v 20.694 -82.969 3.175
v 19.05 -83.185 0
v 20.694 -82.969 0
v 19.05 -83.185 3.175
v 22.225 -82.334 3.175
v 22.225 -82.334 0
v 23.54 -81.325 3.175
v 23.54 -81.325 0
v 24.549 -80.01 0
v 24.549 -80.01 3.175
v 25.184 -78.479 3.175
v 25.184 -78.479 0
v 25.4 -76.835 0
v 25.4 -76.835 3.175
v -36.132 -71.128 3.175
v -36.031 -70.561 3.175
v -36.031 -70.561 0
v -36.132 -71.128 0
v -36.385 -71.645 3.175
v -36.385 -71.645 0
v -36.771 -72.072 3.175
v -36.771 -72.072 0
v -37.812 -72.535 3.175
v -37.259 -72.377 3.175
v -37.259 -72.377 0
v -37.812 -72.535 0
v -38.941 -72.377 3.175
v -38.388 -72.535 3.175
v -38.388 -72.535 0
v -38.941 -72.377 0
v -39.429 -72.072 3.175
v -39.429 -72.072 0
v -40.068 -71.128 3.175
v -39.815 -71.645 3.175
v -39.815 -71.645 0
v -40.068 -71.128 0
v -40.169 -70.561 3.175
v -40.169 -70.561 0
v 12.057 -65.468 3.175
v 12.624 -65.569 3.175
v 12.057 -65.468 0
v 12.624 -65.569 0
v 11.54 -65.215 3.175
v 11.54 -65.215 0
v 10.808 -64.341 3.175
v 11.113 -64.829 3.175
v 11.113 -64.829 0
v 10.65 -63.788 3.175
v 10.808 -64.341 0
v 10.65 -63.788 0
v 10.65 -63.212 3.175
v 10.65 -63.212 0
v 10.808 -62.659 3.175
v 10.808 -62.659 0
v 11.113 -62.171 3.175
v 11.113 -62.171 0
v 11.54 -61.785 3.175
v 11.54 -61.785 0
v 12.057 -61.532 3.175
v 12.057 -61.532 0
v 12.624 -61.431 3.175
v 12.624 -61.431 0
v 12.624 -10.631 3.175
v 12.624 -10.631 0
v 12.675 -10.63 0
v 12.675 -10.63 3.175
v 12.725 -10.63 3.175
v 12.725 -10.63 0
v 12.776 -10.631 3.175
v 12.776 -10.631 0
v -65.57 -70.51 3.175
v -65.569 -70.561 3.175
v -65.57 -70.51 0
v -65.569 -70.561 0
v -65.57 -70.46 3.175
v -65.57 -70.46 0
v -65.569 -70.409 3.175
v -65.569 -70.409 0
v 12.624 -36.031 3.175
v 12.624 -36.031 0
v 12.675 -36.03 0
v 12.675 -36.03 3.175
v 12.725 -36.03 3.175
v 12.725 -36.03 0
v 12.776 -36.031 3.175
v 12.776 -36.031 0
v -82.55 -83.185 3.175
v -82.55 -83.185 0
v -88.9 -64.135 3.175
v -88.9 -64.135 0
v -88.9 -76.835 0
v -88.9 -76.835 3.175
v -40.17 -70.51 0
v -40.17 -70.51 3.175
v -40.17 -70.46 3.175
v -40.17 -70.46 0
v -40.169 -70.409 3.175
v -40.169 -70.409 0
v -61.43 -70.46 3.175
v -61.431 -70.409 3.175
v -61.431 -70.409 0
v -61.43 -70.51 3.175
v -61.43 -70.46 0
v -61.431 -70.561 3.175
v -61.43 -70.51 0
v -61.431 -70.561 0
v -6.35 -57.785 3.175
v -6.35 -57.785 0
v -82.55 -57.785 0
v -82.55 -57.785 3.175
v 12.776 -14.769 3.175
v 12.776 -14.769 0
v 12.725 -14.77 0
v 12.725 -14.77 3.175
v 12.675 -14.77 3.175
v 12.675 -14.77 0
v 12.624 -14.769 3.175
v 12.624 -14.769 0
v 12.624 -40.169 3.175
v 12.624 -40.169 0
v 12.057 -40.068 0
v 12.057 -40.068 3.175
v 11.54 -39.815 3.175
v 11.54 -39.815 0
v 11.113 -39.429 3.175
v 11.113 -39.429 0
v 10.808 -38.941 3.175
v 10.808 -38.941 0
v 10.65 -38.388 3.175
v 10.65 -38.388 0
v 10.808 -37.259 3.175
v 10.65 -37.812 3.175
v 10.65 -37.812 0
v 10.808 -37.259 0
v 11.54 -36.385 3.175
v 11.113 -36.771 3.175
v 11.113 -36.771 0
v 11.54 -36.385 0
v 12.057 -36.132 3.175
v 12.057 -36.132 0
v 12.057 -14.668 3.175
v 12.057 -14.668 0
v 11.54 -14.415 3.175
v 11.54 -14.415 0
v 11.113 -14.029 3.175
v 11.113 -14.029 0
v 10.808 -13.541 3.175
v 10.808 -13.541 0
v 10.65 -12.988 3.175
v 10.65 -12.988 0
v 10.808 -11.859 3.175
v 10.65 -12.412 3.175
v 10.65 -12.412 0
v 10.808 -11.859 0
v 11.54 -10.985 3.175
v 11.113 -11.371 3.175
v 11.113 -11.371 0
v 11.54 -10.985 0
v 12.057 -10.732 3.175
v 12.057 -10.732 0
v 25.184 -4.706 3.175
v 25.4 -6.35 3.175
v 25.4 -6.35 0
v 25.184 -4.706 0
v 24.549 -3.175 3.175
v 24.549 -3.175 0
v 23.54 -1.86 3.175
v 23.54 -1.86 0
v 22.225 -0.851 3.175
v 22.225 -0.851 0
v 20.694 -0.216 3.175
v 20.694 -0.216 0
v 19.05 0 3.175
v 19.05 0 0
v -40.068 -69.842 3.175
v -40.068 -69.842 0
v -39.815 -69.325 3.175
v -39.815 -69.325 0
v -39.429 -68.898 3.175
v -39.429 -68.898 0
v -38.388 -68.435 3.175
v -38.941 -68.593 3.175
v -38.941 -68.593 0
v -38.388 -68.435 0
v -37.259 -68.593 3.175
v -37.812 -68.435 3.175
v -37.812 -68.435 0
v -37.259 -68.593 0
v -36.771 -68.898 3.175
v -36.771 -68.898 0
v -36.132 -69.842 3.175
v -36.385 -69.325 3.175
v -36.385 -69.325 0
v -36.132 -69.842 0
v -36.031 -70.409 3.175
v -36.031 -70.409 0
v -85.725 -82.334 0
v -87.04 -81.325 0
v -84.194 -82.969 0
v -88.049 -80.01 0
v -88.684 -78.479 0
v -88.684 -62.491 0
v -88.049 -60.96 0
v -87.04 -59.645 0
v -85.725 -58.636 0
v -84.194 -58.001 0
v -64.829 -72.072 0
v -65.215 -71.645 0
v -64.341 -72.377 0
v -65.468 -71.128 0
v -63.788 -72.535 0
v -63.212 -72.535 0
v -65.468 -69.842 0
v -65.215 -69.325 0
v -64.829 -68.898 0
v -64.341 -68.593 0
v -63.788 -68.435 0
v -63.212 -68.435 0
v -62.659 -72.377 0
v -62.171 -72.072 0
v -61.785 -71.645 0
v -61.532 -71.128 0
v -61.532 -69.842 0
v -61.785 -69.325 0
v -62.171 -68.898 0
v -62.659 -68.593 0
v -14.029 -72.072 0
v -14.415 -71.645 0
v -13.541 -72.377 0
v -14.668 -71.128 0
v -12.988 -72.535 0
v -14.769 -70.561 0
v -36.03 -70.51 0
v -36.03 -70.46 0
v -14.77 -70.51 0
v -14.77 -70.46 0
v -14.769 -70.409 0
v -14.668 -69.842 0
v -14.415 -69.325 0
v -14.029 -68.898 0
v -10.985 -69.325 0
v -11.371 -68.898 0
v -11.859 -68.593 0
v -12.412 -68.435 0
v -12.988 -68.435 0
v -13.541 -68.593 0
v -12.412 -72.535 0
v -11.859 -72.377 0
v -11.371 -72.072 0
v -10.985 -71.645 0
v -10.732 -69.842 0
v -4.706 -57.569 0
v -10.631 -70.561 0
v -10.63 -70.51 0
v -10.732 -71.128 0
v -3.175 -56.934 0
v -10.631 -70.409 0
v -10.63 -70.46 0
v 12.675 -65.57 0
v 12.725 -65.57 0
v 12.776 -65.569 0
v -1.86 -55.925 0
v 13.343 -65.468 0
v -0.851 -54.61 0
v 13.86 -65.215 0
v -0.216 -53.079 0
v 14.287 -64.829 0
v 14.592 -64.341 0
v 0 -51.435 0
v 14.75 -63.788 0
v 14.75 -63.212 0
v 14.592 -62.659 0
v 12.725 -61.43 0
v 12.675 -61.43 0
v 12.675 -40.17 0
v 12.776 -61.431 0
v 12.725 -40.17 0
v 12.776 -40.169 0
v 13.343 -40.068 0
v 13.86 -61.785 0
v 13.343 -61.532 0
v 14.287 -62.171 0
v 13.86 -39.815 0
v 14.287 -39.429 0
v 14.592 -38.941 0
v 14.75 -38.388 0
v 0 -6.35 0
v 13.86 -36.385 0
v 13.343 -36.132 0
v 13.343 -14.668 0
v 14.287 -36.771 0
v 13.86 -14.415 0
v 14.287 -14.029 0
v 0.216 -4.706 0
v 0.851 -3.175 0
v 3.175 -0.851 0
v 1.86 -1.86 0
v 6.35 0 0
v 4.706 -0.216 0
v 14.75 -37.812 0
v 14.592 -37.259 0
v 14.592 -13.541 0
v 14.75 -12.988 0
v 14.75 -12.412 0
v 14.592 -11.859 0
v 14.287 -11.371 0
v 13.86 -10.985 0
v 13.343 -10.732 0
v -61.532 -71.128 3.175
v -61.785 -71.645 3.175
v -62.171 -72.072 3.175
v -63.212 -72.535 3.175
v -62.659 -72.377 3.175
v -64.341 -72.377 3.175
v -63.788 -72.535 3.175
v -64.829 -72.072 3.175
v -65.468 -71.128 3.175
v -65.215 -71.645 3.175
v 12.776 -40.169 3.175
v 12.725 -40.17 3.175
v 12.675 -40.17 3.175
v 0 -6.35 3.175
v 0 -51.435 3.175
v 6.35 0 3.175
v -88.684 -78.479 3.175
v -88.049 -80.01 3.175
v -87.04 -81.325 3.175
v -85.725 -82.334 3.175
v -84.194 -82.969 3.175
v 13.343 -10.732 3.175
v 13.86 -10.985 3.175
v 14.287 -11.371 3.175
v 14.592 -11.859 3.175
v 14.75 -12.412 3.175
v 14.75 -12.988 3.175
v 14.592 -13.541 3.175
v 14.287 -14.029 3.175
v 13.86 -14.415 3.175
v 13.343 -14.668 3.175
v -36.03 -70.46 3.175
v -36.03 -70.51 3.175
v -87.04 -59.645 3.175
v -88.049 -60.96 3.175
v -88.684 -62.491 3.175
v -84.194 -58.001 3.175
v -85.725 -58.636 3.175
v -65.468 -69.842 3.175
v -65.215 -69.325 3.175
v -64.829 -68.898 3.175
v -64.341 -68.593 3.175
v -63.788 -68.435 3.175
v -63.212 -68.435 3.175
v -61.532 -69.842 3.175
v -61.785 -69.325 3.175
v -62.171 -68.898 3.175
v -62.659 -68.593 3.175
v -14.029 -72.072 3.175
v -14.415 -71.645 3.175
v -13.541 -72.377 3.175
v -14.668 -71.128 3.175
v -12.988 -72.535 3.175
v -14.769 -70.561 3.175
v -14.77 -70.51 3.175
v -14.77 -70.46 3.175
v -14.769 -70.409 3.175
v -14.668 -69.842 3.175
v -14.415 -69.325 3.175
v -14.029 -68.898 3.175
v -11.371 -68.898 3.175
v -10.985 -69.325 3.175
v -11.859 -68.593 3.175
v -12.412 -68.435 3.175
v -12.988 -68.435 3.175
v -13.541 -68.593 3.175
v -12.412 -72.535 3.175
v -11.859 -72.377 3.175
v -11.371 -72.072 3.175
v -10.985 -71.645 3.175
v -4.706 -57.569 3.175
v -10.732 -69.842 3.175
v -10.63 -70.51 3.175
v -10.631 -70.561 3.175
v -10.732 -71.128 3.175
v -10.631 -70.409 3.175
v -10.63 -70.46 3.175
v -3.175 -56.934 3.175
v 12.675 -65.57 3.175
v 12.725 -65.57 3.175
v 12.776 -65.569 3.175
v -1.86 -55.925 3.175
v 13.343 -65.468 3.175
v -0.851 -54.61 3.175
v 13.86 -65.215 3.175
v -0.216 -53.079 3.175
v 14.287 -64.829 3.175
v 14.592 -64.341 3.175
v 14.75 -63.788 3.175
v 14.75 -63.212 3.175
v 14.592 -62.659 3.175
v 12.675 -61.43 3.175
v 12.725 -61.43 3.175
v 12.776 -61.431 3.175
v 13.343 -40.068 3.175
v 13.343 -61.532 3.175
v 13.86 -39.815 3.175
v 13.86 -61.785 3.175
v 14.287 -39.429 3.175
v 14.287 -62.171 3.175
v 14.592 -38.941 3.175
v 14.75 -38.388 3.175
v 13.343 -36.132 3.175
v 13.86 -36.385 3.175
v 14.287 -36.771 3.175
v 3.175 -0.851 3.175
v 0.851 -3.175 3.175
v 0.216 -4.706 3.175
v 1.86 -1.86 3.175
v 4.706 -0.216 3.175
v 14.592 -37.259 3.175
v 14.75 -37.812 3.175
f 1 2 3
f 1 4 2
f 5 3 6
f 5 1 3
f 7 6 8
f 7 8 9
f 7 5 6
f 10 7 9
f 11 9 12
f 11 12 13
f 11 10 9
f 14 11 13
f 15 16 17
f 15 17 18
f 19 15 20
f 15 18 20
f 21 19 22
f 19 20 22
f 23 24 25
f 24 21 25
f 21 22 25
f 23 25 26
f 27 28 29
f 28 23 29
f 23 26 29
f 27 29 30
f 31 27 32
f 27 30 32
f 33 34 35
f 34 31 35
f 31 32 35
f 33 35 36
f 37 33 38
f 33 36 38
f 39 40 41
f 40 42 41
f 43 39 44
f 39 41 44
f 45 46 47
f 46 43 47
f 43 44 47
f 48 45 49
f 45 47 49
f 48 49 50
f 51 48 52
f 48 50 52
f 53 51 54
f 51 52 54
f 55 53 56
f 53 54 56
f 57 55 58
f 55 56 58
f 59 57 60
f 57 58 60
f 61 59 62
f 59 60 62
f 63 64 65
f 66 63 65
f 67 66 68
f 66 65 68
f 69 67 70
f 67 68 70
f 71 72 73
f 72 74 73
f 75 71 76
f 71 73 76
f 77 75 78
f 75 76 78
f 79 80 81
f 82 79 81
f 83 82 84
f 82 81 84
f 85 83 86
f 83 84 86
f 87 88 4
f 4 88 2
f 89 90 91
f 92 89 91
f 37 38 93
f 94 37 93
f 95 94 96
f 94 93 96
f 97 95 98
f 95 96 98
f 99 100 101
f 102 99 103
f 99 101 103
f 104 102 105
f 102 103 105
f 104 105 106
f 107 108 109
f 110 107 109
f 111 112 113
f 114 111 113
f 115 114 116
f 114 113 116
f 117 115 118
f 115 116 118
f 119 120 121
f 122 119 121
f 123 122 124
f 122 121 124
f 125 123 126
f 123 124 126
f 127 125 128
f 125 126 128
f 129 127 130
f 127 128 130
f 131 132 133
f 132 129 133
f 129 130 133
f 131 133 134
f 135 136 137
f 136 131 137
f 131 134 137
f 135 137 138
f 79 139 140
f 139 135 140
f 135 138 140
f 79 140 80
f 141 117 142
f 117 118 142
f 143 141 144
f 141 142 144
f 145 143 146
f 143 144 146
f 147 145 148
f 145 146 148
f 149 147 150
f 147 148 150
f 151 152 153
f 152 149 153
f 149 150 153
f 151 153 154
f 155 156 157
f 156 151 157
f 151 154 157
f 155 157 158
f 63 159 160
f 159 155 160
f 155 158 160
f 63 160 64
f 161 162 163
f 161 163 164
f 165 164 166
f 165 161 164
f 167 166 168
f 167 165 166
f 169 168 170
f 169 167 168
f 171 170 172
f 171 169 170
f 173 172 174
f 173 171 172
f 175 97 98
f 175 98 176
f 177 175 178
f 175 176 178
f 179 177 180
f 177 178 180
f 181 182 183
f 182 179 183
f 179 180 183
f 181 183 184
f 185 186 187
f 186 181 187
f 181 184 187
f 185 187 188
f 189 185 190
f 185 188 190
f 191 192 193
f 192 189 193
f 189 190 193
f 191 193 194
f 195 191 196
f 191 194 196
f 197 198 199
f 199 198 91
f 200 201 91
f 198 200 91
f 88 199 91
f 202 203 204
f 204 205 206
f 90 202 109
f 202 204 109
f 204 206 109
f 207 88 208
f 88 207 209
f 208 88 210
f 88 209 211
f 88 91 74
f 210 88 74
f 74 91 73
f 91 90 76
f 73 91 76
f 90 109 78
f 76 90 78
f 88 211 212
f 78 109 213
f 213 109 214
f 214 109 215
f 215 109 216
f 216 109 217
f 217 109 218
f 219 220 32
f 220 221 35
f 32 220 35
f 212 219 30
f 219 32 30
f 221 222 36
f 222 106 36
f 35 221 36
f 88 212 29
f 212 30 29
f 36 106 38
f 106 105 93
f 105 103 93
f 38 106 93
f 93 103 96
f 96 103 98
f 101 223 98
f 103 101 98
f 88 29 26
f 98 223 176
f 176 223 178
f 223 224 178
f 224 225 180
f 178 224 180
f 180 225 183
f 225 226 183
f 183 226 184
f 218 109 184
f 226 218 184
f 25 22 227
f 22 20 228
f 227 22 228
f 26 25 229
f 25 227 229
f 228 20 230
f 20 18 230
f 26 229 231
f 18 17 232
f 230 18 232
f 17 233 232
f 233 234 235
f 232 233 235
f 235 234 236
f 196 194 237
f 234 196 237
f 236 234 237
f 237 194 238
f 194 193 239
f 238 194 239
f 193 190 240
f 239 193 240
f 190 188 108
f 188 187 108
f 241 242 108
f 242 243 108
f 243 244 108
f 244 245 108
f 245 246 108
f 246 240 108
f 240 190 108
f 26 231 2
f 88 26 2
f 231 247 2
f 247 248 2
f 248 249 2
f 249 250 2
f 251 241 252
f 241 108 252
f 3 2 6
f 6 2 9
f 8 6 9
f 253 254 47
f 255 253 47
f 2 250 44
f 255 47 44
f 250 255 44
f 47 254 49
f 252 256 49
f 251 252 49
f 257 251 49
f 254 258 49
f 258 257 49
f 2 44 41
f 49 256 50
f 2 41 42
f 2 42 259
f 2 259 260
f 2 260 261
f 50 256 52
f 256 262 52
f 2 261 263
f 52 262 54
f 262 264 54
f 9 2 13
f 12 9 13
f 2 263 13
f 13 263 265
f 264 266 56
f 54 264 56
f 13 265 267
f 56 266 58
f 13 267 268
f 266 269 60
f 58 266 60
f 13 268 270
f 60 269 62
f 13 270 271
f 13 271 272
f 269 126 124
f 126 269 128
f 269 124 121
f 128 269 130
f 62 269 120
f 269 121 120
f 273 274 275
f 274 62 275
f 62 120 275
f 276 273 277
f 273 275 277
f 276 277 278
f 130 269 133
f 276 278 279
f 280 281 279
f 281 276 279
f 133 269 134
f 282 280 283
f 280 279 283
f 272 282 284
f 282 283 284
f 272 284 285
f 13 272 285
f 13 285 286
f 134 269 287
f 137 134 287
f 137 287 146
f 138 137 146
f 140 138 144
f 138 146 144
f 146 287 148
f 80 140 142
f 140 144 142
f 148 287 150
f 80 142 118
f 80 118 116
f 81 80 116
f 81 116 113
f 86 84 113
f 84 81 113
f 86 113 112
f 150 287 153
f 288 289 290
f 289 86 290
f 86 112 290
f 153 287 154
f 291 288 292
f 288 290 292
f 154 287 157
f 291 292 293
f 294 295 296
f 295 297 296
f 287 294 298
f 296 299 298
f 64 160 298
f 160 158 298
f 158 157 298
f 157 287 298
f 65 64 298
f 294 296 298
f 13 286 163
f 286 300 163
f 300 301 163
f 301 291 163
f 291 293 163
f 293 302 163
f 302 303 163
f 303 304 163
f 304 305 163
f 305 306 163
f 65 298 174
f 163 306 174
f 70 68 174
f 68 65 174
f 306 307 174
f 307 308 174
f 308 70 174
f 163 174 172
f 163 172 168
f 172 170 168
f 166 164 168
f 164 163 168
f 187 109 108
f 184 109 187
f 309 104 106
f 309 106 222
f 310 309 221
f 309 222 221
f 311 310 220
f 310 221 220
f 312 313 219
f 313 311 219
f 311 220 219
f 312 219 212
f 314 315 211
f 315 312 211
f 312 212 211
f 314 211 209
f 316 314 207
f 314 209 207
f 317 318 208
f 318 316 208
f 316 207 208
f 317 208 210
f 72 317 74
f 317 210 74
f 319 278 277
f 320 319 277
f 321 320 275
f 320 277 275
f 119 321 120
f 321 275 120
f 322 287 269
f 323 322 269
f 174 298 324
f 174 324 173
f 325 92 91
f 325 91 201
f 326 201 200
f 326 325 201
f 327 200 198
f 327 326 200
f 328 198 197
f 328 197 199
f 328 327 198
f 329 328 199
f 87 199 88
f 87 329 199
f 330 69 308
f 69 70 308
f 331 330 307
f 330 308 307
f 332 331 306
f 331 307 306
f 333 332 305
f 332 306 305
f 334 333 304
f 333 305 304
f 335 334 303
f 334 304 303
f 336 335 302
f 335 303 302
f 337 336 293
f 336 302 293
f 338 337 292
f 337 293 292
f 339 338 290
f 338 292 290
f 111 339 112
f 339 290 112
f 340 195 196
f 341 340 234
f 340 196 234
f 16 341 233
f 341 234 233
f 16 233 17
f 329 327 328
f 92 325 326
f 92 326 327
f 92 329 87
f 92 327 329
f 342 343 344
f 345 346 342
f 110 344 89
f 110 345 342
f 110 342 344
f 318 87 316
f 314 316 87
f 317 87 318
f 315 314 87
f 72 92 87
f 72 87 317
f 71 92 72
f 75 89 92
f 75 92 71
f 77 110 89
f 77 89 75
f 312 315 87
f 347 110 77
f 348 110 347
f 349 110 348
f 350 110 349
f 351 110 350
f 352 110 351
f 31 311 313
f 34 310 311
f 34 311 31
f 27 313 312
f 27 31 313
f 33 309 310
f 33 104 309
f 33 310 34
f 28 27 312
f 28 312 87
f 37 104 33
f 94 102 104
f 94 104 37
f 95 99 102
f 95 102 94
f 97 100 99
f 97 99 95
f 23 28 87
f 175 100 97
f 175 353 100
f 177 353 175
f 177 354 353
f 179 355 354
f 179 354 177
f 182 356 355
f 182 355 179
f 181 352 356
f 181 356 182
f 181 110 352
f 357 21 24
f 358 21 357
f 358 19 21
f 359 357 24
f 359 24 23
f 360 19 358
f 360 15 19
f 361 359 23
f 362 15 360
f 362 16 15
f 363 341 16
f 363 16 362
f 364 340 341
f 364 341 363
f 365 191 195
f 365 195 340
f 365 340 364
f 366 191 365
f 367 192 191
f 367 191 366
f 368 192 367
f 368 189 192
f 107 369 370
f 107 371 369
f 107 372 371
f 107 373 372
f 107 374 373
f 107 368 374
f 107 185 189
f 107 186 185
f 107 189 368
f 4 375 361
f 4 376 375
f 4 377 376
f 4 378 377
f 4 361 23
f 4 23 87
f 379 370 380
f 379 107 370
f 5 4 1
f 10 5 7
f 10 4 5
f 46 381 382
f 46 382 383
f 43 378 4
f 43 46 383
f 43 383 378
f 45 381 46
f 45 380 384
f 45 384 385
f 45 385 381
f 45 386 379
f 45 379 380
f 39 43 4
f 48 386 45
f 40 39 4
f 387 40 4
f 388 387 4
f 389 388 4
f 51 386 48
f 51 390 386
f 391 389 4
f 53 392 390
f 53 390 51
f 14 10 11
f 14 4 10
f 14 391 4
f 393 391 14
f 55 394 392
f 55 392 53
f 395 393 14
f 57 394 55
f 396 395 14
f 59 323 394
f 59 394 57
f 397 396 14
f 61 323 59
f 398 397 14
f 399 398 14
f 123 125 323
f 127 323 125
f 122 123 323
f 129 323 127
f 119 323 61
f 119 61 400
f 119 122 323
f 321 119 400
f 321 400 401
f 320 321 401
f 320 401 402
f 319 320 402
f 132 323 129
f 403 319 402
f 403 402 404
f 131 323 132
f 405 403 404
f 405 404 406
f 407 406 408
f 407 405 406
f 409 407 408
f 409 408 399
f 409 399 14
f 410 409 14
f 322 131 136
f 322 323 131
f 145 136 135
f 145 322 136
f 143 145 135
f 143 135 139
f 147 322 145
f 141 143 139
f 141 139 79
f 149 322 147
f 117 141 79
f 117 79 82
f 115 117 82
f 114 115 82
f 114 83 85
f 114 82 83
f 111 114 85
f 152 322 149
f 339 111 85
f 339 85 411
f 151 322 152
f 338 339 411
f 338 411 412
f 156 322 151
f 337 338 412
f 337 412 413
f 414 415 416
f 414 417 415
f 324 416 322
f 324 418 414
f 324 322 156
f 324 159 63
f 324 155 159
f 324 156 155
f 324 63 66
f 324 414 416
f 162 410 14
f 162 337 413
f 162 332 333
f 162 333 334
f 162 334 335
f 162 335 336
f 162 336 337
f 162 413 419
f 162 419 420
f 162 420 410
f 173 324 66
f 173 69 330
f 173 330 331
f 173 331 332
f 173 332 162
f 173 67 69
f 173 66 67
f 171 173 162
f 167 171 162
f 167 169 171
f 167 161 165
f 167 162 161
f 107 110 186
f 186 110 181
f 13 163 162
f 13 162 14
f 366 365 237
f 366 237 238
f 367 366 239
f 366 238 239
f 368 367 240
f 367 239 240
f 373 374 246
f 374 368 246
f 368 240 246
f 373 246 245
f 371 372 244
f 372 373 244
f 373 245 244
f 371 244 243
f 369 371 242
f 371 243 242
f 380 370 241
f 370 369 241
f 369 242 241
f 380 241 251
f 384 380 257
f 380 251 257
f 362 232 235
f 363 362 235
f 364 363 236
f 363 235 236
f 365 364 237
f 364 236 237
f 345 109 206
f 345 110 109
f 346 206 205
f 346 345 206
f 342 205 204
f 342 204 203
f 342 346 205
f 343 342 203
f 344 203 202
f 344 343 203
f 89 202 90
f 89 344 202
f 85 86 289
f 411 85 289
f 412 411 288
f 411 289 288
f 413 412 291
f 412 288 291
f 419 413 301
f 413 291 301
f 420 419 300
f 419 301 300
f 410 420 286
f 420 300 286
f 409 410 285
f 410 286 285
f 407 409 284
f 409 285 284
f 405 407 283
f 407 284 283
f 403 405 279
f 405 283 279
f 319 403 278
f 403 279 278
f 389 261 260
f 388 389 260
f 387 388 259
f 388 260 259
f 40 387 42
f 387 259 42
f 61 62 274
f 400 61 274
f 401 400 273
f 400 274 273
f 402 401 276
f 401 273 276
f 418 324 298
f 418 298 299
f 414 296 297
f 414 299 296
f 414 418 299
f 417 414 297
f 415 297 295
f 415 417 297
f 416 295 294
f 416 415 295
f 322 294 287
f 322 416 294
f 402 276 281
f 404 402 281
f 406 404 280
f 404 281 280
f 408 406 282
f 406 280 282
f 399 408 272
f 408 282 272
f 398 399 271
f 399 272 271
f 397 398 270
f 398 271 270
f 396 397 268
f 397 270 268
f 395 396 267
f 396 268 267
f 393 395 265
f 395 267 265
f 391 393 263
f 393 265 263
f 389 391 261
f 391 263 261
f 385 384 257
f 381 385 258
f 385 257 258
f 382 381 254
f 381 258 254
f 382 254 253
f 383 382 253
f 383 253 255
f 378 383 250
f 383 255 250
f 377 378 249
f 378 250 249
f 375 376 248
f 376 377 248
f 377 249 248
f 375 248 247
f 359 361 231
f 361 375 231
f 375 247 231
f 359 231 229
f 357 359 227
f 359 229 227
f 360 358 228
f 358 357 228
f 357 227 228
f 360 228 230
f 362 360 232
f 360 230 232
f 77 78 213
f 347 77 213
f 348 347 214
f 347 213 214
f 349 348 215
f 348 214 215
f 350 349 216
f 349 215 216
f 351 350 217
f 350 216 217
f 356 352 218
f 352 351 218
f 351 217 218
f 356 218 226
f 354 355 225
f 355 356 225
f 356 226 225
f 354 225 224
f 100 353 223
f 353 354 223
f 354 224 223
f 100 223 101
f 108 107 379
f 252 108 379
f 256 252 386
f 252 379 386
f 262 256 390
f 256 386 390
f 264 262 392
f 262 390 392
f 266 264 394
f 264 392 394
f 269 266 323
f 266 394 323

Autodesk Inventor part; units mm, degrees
ref_plane "YZ Plane" through (0, 0, 0) normal (1, 0, 0) x (0, 1, 0)
ref_plane "XZ Plane" through (0, 0, 0) normal (0, 1, 0) x (-1, 0, 0)
ref_plane "XY Plane" through (0, 0, 0) normal (0, 0, 1) x (1, 0, 0)
ref_plane "Work Plane1" through (7.5537, -38.3367, 0) normal (0, 0, 1) x (1, 0, 0)
sketch "Sketch1" plane through (7.5537, -38.3367, 0) normal (0, 0, 1) x (1, 0, 0)
  line L0 (-7.5537, -44.8483) -> (5.0701, -44.8483)
  line L1 (5.0701, -44.8483) -> (5.0701, -27.232)
  arc A0 (5.0701, -23.0946) -> (5.0701, -27.232) centre (5.1463, -25.1633) ccw
  line L2 (5.0701, -23.0946) -> (5.0701, -1.832)
  arc A1 (5.0701, 2.3054) -> (5.0701, -1.832) centre (5.1463, 0.2367) ccw
  line L3 (5.0701, 2.3054) -> (5.0701, 23.568)
  arc A2 (5.0701, 27.7054) -> (5.0701, 23.568) centre (5.1463, 25.6367) ccw
  line L4 (5.0701, 27.7054) -> (5.0701, 38.3367)
  line L5 (-7.5537, 38.3367) -> (5.0701, 38.3367)
  line L6 (-7.5537, 38.3367) -> (-7.5537, -44.8483)
  line L7 (5.2225, -44.8483) -> (17.8463, -44.8483)
  line L8 (17.8463, 38.3367) -> (17.8463, -44.8483)
  line L9 (5.2225, 38.3367) -> (17.8463, 38.3367)
  line L10 (5.2225, 27.7054) -> (5.2225, 38.3367)
  arc A3 (5.2225, 23.568) -> (5.2225, 27.7054) centre (5.1463, 25.6367) ccw
  line L11 (5.2225, 2.3054) -> (5.2225, 23.568)
  arc A4 (5.2225, -1.832) -> (5.2225, 2.3054) centre (5.1463, 0.2367) ccw
  line L12 (5.2225, -23.0946) -> (5.2225, -1.832)
  arc A5 (5.2225, -27.232) -> (5.2225, -23.0946) centre (5.1463, -25.1633) ccw
  line L13 (5.2225, -44.8483) -> (5.2225, -27.232)
  line L14 (-96.4537, -34.2184) -> (-96.4537, -44.8483)
  line L15 (-7.5537, -44.8483) -> (-96.4537, -44.8483)
  line L16 (-7.5537, -32.2245) -> (-7.5537, -44.8483)
  line L17 (-18.185, -32.2245) -> (-7.5537, -32.2245)
  arc A6 (-22.3224, -32.2245) -> (-18.185, -32.2245) centre (-20.2537, -32.1483) ccw
  line L18 (-43.585, -32.2245) -> (-22.3224, -32.2245)
  arc A7 (-47.7224, -32.2245) -> (-43.585, -32.2245) centre (-45.6537, -32.1483) ccw
  line L19 (-68.985, -32.2245) -> (-47.7224, -32.2245)
  arc A8 (-73.1224, -32.2245) -> (-68.985, -32.2245) centre (-71.0537, -32.1483) ccw
  line L20 (-94.385, -32.2245) -> (-73.1224, -32.2245)
  arc A9 (-96.4537, -34.2184) -> (-94.385, -32.2245) centre (-96.4537, -32.1483) ccw
  line L21 (-96.4537, -19.4483) -> (-96.4537, -30.0782)
  arc A10 (-94.385, -32.0721) -> (-96.4537, -30.0782) centre (-96.4537, -32.1483) ccw
  line L22 (-94.385, -32.0721) -> (-73.1224, -32.0721)
  arc A11 (-68.985, -32.0721) -> (-73.1224, -32.0721) centre (-71.0537, -32.1483) ccw
  line L23 (-68.985, -32.0721) -> (-47.7224, -32.0721)
  arc A12 (-43.585, -32.0721) -> (-47.7224, -32.0721) centre (-45.6537, -32.1483) ccw
  line L24 (-43.585, -32.0721) -> (-22.3224, -32.0721)
  arc A13 (-18.185, -32.0721) -> (-22.3224, -32.0721) centre (-20.2537, -32.1483) ccw
  line L25 (-18.185, -32.0721) -> (-7.5537, -32.0721)
  line L26 (-7.5537, -19.4483) -> (-7.5537, -32.0721)
  line L27 (-7.5537, -19.4483) -> (-96.4537, -19.4483)
  line L28 (-7.5537, 38.3367) -> (17.8463, 38.3367)
  line L29 (17.8463, 38.3367) -> (17.8463, -44.8483)
  line L30 (17.8463, -44.8483) -> (-7.5537, -44.8483)
  line L31 (-7.5537, -44.8483) -> (-7.5537, 38.3367)
  line L32 (-96.4537, -19.4483) -> (-7.5537, -19.4483)
  line L33 (-7.5537, -19.4483) -> (-7.5537, -44.8483)
  line L34 (-7.5537, -44.8483) -> (-96.4537, -44.8483)
  line L35 (-96.4537, -44.8483) -> (-96.4537, -19.4483)
  circle A14 centre (5.1463, -25.1633) radius 2.0701
  circle A15 centre (5.1463, 0.2367) radius 2.0701
  circle A16 centre (-45.6537, -32.1483) radius 2.0701
  circle A17 centre (-20.2537, -32.1483) radius 2.0701
  circle A18 centre (-71.0537, -32.1483) radius 2.0701
  circle A19 centre (5.1463, 25.6367) radius 2.0701
extrude "Plate1" add sketch "Sketch1" along normal blind 3.175 contours L6 L5 L4 A2 L3 A1 L2 A0 L1 L0 | L15 L14 A9 L20 A8 L19 A7 L18 A6 L17 L6 | L1 A14 L13 L30 | L17 A17 L25 L6 | L13 A5 L12 A4 L11 A3 L10 L9 L8 L7 | L25 A13 L24 A12 L23 A11 L22 A10 L21 L27 L6 | L35 A10 L22 A18 L20 A9 | L2 A15 L12 A14 | L18 A16 L24 A17 | L3 A19 L11 A15 | L10 A19 L4 L28 | L19 A18 L23 A16
fillet "Corner Round1" radius 6.35 6 edges at (0, 0, 1.5875) (25.4, 0, 1.5875) (-88.9, -57.785, 1.5875) (-88.9, -83.185, 1.5875) (0, -57.785, 1.5875) (25.4, -83.185, 1.5875)
equation "\"BendRadius\" = Thickness"
equation "\"BendReliefWidth\" = Thickness"
equation "\"BendReliefDepth\" = 0.5 * Thickness"
equation "\"CornerReliefSize\" = 4 * Thickness"
equation "\"MinimumRemnant\" = 2 * Thickness"
equation "\"TransitionRadius\" = BendRadius"
equation "\"JacobiRadiusSize\" = BendRadius"
equation "\"GapSize\" = Thickness"
equation "\"d0\" = BendRadius"
equation "\"Thickness\" = 3.175"
properties part number "Bumper Holder"
